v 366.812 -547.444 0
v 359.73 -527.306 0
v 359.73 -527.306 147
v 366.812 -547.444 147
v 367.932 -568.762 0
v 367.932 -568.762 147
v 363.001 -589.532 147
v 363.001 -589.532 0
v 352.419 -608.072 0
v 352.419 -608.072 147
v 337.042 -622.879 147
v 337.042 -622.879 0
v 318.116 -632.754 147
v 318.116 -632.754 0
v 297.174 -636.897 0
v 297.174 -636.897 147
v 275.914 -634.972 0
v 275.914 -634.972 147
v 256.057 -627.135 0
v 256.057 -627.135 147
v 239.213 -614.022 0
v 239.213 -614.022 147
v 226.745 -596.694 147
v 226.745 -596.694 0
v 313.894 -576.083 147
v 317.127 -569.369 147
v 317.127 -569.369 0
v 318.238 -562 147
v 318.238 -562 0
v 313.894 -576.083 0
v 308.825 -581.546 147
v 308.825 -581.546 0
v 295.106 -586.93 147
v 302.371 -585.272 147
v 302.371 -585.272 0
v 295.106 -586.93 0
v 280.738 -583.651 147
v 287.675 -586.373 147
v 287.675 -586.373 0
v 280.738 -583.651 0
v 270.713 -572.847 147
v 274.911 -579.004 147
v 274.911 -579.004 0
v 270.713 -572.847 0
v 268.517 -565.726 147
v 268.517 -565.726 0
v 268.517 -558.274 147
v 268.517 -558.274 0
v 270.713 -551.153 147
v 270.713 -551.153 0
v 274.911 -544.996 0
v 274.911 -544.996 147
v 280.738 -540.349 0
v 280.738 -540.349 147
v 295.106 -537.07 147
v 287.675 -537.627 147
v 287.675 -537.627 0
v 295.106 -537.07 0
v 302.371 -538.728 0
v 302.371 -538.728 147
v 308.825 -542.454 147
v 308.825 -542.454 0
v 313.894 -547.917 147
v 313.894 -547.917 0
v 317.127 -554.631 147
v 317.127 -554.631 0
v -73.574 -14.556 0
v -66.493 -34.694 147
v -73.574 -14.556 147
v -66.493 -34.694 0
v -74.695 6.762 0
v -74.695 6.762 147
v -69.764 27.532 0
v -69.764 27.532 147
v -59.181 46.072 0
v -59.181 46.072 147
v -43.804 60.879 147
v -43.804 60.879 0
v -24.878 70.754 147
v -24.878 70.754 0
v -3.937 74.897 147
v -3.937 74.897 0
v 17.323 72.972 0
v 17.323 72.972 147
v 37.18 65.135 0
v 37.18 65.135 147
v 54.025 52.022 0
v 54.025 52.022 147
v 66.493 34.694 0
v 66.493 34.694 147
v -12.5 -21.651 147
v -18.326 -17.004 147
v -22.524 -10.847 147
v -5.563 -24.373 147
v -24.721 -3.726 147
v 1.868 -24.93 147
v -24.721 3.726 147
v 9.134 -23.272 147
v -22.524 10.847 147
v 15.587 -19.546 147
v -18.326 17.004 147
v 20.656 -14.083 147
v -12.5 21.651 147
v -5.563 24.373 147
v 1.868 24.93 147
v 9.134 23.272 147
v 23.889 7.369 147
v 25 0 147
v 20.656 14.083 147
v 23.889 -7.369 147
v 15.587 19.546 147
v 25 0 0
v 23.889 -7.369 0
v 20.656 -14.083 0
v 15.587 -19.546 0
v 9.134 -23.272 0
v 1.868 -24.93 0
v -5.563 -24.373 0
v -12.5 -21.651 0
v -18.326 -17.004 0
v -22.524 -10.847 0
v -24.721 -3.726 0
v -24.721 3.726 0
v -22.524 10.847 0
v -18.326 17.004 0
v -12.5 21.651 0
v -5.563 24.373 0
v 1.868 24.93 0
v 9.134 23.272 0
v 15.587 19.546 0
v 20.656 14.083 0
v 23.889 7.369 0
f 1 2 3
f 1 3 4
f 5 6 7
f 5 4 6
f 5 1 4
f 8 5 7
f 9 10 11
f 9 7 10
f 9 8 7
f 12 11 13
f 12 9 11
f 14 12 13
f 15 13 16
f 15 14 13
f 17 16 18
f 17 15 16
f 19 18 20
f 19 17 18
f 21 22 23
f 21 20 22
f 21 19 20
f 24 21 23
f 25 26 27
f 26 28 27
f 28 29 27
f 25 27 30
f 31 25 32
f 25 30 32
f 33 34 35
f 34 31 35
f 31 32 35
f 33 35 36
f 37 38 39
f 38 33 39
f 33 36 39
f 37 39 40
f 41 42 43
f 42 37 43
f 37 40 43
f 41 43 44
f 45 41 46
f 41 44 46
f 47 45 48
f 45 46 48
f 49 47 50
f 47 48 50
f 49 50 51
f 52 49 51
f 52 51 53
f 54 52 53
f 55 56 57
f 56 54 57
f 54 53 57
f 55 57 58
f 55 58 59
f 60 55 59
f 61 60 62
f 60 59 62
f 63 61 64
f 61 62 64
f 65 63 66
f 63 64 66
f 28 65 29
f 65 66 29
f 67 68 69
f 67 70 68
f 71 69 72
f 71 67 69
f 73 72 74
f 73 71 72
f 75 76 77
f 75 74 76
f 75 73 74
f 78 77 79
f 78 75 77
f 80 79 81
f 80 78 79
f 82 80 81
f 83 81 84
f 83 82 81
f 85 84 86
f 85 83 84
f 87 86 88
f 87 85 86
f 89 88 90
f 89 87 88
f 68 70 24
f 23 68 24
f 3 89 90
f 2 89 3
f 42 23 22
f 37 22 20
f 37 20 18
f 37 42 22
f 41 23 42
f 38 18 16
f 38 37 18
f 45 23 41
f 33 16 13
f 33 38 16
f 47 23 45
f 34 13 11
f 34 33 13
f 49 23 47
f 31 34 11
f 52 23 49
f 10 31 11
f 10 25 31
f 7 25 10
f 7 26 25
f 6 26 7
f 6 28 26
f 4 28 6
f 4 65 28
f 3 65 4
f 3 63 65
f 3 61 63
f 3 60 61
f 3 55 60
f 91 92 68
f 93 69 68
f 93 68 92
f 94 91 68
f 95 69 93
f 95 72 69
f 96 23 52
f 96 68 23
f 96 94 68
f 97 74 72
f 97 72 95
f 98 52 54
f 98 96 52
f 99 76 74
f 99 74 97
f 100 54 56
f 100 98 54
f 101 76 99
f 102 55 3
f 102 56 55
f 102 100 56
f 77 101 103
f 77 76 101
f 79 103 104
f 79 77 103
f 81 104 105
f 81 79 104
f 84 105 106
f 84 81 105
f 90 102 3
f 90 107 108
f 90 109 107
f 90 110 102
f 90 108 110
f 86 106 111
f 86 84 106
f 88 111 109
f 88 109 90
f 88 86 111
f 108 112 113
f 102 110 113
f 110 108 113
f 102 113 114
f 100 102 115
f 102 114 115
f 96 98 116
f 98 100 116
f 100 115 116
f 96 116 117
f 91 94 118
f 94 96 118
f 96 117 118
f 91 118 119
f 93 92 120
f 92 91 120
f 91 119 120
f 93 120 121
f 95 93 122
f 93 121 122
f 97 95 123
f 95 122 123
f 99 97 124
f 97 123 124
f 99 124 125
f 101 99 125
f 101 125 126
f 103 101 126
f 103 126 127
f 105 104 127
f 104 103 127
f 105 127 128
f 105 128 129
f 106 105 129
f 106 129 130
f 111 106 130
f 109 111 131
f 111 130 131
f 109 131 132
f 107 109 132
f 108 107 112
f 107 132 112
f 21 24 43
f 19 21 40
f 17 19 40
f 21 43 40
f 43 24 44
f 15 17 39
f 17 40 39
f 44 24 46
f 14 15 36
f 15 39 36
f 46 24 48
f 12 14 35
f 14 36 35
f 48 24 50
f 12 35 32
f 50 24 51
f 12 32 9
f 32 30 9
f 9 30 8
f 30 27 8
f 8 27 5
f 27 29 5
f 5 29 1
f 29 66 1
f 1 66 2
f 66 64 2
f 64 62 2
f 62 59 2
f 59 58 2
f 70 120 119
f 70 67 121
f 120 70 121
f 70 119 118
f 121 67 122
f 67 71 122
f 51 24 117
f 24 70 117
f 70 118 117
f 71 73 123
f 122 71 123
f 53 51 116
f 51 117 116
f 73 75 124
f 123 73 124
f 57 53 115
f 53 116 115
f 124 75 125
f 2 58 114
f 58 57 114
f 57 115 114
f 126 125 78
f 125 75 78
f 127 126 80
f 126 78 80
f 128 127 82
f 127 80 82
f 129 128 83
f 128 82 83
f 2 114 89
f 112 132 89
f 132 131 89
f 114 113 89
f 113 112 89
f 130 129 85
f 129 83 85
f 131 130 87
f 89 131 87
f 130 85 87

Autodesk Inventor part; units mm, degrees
ref_plane "YZ Plane" through (0, 0, 0) normal (1, 0, 0) x (0, 1, 0)
ref_plane "XZ Plane" through (0, 0, 0) normal (0, 1, 0) x (-1, 0, 0)
ref_plane "XY Plane" through (0, 0, 0) normal (0, 0, 1) x (1, 0, 0)
sketch "Sketch1" plane through (0, 0, 0) normal (0, 0, 1) x (1, 0, 0)
  arc A0 (66.4929, 34.6943) -> (-66.4929, -34.6943) centre (0, 0) ccw
  circle A1 centre (0, 0) radius 25
  arc A2 (226.7447, -596.6943) -> (359.7304, -527.3057) centre (293.2376, -562) ccw
  circle A3 centre (293.2376, -562) radius 25
  line L0 (-66.4929, -34.6943) -> (226.7447, -596.6943)
  line L1 (66.4929, 34.6943) -> (359.7304, -527.3057)
  dimension "d0" = 150
  dimension "d1" = 50
  dimension "d2" = 150
  dimension "d3" = 50
  dimension "d4" = 562
extrude "Extrusion1" add sketch "Sketch1" along normal blind 147
properties part number "FIRST ARM"
